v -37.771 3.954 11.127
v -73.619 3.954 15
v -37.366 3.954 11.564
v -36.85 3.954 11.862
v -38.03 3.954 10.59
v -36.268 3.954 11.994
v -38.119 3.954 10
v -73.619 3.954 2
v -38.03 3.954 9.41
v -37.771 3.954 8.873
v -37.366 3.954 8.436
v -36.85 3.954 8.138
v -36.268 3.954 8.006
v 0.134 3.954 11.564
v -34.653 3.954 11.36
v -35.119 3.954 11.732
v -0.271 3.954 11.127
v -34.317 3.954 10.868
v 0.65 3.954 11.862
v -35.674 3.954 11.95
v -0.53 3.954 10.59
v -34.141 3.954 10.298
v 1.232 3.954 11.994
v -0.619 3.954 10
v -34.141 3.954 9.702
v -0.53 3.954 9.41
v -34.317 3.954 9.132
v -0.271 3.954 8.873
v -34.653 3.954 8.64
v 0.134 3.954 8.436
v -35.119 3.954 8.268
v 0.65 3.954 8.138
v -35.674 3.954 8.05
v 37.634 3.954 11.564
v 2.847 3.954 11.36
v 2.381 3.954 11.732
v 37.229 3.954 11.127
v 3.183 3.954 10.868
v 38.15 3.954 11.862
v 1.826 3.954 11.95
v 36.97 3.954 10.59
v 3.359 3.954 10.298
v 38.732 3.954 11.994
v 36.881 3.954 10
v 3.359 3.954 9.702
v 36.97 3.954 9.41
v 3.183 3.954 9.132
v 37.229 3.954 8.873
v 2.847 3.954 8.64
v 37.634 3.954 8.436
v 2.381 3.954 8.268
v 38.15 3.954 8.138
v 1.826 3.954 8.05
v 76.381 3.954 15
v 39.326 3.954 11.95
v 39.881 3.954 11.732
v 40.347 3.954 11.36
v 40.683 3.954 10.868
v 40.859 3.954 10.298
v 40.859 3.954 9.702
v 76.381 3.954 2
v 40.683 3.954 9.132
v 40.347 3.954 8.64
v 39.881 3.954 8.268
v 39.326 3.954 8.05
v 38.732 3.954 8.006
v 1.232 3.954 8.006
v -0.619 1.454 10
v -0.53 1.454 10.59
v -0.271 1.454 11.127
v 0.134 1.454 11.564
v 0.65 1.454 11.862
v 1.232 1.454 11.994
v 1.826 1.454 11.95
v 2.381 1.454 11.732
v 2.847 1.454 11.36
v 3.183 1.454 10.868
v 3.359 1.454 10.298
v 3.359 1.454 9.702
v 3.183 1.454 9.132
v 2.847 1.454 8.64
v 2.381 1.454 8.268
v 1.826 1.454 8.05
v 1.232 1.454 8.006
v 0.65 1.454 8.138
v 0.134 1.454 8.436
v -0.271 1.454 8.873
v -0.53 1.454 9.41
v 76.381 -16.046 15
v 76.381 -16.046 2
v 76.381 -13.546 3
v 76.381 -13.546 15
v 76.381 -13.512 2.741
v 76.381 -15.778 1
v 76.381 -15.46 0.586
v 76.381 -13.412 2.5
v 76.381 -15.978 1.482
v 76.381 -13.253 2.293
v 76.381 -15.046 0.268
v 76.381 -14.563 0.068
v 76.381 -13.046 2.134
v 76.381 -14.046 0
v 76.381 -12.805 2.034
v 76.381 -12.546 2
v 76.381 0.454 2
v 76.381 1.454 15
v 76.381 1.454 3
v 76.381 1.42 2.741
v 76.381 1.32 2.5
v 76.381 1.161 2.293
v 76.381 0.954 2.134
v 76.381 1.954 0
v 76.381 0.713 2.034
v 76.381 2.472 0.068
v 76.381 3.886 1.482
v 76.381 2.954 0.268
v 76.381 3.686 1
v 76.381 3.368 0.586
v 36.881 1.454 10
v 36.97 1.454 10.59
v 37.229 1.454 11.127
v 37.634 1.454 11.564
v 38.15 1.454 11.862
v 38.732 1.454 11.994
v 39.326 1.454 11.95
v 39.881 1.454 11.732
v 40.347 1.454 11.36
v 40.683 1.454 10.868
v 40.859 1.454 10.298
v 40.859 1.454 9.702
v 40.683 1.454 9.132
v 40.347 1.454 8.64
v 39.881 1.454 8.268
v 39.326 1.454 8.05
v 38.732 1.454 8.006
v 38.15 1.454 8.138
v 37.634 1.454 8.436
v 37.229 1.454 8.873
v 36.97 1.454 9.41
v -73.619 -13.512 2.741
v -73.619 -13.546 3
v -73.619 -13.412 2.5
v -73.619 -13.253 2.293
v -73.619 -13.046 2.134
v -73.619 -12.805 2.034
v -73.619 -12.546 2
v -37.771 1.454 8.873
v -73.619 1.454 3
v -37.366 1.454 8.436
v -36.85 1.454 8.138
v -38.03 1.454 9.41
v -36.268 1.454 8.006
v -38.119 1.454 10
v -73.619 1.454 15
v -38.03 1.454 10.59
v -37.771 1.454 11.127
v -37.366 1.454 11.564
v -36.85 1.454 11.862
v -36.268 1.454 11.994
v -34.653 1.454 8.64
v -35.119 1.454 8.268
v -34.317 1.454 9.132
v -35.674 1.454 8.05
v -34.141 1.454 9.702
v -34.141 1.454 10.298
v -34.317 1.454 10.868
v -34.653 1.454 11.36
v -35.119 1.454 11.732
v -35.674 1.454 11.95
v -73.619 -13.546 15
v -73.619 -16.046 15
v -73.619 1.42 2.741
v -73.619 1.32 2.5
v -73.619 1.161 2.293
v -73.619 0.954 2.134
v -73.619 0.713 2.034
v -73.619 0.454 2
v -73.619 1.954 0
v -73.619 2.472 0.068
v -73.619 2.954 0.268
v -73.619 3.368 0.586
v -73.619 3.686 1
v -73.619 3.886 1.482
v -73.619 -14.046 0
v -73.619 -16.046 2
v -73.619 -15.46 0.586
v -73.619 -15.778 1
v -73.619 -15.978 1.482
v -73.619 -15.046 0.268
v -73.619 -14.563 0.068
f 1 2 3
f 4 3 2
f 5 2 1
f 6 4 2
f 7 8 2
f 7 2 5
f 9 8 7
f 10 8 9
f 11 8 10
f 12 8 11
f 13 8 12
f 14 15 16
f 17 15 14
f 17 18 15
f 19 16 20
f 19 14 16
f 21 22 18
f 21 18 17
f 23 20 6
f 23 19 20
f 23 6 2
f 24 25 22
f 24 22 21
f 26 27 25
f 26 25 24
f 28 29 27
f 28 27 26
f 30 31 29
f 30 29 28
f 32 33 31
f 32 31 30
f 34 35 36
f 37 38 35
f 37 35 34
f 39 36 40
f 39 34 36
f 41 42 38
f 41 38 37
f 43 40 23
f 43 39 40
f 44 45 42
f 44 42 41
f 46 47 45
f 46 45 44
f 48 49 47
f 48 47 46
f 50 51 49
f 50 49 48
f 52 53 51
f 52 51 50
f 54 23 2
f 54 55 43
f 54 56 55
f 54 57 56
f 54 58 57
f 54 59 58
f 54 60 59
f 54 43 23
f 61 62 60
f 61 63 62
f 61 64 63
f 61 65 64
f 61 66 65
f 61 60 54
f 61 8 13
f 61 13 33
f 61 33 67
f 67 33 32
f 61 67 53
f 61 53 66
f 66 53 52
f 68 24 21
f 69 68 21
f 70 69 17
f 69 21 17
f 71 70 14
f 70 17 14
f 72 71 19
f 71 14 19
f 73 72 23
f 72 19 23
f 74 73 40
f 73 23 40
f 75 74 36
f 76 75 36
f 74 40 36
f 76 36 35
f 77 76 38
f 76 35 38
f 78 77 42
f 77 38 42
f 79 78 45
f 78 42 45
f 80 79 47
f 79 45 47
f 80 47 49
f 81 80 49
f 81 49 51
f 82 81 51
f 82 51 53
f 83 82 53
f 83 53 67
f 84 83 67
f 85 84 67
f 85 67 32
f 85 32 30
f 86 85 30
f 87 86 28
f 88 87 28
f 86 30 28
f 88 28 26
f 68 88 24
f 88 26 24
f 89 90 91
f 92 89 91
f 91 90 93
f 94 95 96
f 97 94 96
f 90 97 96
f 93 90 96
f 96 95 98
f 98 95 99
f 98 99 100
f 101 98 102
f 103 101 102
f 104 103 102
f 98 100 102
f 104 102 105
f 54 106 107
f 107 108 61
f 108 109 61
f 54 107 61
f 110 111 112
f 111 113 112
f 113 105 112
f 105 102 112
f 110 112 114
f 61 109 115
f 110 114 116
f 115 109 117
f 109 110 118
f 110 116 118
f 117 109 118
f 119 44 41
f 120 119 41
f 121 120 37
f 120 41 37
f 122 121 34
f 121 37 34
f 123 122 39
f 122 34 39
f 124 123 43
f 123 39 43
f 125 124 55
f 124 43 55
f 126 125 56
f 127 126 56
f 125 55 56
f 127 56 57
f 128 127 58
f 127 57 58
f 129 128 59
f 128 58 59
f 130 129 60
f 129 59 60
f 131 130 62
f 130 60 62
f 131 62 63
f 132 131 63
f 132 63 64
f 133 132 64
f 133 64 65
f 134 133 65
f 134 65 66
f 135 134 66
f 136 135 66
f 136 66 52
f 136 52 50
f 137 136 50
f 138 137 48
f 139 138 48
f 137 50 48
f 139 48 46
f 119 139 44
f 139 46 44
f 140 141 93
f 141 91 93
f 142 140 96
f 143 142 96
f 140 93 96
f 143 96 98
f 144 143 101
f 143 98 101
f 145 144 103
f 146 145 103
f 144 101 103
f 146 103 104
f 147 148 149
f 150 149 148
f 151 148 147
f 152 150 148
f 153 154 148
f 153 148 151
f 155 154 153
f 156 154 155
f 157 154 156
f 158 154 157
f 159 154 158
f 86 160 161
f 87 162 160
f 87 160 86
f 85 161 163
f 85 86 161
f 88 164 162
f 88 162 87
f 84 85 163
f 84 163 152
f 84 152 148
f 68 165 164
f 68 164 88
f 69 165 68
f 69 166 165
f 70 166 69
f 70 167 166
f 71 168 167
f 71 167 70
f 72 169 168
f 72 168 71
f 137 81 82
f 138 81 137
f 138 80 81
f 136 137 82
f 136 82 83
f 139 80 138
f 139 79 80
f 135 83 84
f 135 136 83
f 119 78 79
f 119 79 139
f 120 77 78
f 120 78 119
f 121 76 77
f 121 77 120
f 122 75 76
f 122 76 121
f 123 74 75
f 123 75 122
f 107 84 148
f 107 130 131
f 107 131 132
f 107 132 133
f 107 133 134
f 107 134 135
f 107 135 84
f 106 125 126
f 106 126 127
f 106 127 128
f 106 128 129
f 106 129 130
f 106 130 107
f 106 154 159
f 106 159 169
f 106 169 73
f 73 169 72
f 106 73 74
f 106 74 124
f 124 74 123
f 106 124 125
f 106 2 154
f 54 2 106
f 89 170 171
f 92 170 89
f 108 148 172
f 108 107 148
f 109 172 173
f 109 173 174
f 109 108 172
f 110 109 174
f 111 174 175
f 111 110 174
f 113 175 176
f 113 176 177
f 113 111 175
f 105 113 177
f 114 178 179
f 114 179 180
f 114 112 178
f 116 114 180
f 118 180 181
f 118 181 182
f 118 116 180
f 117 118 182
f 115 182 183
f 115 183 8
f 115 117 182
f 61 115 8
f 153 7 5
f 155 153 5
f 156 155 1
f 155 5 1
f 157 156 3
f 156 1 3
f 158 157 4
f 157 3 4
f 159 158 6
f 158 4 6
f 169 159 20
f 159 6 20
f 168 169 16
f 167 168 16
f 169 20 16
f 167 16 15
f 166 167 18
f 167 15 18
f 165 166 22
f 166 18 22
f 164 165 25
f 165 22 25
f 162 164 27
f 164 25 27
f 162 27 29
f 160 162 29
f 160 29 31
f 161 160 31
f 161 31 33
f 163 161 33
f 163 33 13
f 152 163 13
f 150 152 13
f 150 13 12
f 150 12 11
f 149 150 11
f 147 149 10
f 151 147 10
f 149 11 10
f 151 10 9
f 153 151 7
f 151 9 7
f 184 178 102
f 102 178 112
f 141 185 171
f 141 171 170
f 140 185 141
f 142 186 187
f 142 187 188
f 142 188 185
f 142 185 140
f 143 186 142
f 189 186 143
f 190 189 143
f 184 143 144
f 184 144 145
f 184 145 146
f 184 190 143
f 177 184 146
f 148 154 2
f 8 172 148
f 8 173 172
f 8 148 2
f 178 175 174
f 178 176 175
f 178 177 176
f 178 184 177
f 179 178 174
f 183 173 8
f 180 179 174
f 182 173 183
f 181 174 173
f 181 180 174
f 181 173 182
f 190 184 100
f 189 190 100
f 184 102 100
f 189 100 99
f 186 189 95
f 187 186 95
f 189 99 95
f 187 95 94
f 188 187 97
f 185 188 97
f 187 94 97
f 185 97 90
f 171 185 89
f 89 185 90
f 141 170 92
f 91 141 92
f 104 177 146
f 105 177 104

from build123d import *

# Parameters (mm, degrees)
F0_W     = 150
F0_H     = 20
F1_DEPTH = 15
F2_W     = 150
F2_H     = 15
F3_DEPTH = 13
F4_R     = 2
F5_DEPTH = 2.5
F6_R     = 2
F7_R     = 1


with BuildPart() as f1:
    # F0 (on Top) → F1 (new body)
    with BuildSketch(Plane.XY):
        with Locations((1.380986, -6.045858)):
            Rectangle(F0_W, F0_H)
    extrude(amount=F1_DEPTH)

    # F2 (on face) → F3 (cut)
    with BuildSketch(Plane.XY.offset(15)):
        with Locations((1.380986, -6.045858)):
            Rectangle(F2_W, F2_H)
    extrude(amount=-F3_DEPTH, mode=Mode.SUBTRACT)

    # F4 (on face) → F5 (cut)
    with BuildSketch(Plane(origin=(0, 3.954142, 0), x_dir=(-1, 0, 0), z_dir=(0, 1, 0))):
        with Locations((-38.880986, 10)):
            Circle(F4_R)
        with Locations((-1.380986, 10)):
            Circle(F4_R)
        with Locations((36.119014, 10)):
            Circle(F4_R)
    extrude(amount=-F5_DEPTH, mode=Mode.SUBTRACT)

    # F6
    f6_edges = [f1.edges().sort_by_distance(p)[0] for p in [
        (1.380986, -16.045858, 0),
        (1.380986, 3.954142, 0),
    ]]
    fillet(f6_edges, radius=F6_R)

    # F7
    f7_edges = [f1.edges().sort_by_distance(p)[0] for p in [
        (1.380986, -13.545858, 2),
        (1.380986, 1.454142, 2),
    ]]
    fillet(f7_edges, radius=F7_R)


solid = f1.part
